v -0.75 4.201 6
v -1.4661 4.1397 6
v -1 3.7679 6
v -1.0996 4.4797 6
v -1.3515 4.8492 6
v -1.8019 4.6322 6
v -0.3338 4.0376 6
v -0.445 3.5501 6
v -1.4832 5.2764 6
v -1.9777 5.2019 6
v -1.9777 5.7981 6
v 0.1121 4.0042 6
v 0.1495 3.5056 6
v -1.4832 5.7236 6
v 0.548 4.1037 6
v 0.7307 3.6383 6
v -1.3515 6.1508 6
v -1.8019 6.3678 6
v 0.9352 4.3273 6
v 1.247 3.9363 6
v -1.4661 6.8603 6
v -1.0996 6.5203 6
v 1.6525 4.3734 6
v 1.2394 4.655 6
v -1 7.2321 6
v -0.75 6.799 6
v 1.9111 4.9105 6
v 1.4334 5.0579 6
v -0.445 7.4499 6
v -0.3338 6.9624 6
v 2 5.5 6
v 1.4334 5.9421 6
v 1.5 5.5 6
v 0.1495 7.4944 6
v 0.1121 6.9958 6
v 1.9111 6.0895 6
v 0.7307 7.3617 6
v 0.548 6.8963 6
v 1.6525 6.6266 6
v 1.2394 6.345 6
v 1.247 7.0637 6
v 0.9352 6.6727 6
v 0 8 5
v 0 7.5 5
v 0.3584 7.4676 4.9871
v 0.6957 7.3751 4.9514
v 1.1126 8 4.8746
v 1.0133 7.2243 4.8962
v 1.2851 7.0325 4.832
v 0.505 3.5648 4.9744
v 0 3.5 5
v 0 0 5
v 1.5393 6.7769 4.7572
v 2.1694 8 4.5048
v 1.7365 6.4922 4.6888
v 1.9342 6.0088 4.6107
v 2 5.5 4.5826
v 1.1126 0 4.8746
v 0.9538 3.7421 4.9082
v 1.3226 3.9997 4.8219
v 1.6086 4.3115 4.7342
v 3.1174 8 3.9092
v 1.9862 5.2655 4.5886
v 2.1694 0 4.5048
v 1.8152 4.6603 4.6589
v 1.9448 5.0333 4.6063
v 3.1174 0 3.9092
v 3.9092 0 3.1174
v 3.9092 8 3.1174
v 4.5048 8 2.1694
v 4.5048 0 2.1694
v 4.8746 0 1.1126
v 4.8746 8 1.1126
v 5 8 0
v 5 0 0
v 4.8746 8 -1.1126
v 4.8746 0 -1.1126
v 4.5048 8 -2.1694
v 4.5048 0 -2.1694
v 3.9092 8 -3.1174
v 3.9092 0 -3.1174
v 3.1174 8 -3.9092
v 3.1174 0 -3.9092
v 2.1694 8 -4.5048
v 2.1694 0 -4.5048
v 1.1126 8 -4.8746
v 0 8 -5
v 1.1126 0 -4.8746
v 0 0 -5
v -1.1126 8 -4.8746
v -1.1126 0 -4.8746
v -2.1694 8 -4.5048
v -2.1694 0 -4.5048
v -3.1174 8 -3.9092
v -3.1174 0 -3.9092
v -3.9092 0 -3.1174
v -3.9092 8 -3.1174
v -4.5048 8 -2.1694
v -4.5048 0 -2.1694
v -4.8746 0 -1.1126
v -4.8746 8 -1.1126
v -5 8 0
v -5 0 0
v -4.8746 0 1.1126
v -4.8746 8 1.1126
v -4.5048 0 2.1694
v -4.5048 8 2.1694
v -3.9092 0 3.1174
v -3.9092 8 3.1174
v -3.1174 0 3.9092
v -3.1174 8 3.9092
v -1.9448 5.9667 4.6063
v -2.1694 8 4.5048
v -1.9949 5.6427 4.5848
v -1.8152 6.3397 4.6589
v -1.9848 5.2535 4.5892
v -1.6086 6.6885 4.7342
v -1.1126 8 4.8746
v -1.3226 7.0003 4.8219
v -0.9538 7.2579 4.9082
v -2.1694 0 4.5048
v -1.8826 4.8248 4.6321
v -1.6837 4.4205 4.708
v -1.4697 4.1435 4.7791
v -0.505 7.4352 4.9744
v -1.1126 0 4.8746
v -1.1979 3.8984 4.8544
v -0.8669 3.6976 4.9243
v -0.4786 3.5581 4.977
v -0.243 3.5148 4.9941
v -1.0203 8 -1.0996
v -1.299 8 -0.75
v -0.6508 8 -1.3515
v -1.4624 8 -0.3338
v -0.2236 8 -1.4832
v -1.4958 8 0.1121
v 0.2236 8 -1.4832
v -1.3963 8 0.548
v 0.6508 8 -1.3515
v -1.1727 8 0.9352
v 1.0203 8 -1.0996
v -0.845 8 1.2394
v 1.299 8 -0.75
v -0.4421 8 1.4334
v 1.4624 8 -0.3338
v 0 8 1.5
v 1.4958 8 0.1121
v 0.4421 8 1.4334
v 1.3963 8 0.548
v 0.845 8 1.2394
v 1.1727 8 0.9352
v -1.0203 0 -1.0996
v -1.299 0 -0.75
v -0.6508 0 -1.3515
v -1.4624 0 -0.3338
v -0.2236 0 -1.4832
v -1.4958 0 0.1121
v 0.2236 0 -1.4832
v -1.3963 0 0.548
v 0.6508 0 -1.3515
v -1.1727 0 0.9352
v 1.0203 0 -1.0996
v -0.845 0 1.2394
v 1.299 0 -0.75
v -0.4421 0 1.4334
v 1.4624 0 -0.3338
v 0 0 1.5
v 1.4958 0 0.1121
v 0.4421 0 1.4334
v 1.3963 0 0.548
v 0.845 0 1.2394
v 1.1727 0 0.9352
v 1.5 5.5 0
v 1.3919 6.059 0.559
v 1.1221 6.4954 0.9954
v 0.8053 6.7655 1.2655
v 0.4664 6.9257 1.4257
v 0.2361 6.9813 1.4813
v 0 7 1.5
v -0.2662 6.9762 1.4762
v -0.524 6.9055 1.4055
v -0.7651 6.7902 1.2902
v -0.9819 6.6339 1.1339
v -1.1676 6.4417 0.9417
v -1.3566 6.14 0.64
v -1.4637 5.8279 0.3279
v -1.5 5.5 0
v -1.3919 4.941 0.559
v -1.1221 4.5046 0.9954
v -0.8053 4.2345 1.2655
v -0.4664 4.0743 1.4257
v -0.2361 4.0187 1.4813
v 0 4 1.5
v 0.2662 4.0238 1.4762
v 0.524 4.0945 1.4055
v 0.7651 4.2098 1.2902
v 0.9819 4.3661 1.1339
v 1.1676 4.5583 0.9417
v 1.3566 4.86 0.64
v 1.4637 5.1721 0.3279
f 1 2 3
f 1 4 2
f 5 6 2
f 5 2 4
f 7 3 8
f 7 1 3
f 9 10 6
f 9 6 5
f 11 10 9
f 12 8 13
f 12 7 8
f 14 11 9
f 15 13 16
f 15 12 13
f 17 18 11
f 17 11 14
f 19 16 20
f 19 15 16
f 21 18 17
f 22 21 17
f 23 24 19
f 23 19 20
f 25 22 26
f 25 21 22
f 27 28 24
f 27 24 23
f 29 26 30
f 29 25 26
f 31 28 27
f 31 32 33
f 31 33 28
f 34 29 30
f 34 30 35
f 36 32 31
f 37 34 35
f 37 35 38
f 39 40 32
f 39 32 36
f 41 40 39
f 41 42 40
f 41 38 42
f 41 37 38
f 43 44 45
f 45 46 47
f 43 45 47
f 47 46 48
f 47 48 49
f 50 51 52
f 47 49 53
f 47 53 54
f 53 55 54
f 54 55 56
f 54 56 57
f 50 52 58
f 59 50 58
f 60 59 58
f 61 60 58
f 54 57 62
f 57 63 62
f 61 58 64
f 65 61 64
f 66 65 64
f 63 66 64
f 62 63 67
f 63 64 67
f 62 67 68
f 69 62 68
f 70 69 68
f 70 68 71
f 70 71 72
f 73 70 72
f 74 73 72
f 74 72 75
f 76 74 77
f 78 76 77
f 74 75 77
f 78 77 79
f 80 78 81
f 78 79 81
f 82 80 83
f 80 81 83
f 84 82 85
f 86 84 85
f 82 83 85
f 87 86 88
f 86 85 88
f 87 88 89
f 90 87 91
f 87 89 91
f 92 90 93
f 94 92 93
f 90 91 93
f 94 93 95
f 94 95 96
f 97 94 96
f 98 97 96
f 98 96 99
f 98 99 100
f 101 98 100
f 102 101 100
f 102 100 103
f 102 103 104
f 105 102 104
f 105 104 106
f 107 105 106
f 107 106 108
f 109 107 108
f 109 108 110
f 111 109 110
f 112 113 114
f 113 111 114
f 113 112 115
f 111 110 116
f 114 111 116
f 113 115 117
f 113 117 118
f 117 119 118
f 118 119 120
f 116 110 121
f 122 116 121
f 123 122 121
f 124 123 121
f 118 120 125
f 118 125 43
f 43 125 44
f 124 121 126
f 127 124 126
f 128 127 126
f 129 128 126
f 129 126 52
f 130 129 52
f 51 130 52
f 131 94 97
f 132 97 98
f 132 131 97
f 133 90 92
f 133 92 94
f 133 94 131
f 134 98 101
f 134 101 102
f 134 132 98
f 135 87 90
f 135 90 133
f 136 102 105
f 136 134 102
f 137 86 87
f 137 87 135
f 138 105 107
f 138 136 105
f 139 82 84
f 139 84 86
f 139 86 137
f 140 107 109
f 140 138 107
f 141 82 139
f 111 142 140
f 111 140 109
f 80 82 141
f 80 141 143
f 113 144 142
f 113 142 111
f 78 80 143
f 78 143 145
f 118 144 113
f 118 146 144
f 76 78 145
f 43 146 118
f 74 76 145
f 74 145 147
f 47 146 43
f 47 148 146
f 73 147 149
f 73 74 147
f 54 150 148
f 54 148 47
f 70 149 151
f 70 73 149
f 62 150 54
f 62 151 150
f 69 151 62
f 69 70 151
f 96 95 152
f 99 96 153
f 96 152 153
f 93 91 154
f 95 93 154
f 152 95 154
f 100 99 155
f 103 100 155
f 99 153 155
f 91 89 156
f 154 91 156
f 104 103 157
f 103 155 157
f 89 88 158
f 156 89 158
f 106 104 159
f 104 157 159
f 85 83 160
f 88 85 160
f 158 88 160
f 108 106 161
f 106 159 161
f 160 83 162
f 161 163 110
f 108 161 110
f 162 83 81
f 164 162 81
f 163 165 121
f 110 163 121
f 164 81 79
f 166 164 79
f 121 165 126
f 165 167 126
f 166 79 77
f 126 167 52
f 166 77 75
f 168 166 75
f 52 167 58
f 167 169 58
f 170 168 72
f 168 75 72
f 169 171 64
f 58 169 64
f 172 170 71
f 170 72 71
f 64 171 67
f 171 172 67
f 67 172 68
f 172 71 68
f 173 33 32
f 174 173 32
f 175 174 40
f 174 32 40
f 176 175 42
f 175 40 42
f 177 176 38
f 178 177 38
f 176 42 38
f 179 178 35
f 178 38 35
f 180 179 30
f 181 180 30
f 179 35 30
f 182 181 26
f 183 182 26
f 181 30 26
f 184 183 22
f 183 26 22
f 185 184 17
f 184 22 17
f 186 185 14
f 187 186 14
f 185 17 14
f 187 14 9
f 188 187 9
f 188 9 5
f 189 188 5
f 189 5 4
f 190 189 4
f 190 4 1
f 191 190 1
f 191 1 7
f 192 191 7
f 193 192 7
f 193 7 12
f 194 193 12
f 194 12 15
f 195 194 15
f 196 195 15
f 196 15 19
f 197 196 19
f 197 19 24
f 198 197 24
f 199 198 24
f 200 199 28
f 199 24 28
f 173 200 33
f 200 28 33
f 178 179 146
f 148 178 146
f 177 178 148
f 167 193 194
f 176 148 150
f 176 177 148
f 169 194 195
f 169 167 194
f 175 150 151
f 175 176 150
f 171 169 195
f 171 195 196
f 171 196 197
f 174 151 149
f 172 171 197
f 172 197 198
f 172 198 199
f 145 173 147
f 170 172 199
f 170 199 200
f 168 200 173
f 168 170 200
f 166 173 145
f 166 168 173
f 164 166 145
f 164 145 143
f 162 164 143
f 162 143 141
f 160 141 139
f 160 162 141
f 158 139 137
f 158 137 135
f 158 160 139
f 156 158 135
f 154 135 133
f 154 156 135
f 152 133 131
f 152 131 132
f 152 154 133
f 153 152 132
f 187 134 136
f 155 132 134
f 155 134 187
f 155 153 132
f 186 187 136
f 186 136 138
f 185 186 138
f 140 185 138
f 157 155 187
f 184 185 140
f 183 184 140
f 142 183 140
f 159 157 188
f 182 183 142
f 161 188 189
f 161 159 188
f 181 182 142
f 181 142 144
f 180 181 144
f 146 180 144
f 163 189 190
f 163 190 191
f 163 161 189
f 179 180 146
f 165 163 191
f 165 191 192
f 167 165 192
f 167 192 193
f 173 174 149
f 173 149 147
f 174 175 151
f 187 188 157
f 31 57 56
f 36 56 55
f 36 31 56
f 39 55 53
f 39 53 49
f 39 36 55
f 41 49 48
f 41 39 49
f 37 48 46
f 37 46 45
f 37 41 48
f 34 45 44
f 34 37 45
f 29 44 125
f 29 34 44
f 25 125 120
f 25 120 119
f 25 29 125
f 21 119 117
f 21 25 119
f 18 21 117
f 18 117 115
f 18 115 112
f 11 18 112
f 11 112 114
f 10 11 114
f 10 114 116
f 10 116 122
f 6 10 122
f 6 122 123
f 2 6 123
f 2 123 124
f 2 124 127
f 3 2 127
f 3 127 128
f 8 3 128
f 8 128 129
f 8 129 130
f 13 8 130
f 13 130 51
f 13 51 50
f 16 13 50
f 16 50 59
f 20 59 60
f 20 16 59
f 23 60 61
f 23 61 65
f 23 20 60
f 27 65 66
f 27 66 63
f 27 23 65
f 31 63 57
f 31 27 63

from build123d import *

# Parameters (mm, degrees)
SKETCH1_R               = 5
SKETCH1_R_2             = 1.5
BOSS_EXTRUDE1_DEPTH     = 8
SKETCH6_R               = 2
BOSS_EXTRUDE4_DEPTH     = 3.5
CUT_EXTRUDE3_REACH      = 16.491
CUT_EXTRUDE3_END_RADIUS = 1.5
SKETCH7_R               = 1.5


with BuildPart() as part:
    # Sketch1 → Boss-Extrude1 (new body)
    with BuildSketch(Plane(origin=(0, 0, 0), x_dir=(1, 0, 0), z_dir=(0, 1, 0))):
        with Locations(Location((0, 0, 0), (0, 0, 270))):
            Circle(SKETCH1_R)
        with Locations(Location((0, 0, 0), (0, 0, 270))):
            Circle(SKETCH1_R_2, mode=Mode.SUBTRACT)
    extrude(amount=BOSS_EXTRUDE1_DEPTH)

    # Sketch6 → Boss-Extrude4 (add)
    with BuildSketch(Plane.XY.offset(6)):
        with Locations((0, 5.5)):
            Circle(SKETCH6_R)
    extrude(amount=-BOSS_EXTRUDE4_DEPTH)

    # Cut-Extrude3: up to this cylinder (the profile starts outside it)
    cut_extrude3_end = Plane(origin=(0, 5.5, 0), z_dir=(0, -1, 0)) * Cylinder(CUT_EXTRUDE3_END_RADIUS, 36.982, mode=Mode.PRIVATE)
    # Sketch7 → Cut-Extrude3 (cut, up to the surface)
    with BuildSketch(Plane.XY.offset(6), mode=Mode.PRIVATE) as cut_extrude3_sk1:
        with Locations((0, 5.5)):
            Circle(SKETCH7_R)
    cut_extrude3_tool1 = extrude(cut_extrude3_sk1.sketch, amount=-CUT_EXTRUDE3_REACH, mode=Mode.PRIVATE) - cut_extrude3_end
    add(cut_extrude3_tool1.solids().sort_by_distance((0, 5.5, 6))[0], mode=Mode.SUBTRACT)


solid = part.part
